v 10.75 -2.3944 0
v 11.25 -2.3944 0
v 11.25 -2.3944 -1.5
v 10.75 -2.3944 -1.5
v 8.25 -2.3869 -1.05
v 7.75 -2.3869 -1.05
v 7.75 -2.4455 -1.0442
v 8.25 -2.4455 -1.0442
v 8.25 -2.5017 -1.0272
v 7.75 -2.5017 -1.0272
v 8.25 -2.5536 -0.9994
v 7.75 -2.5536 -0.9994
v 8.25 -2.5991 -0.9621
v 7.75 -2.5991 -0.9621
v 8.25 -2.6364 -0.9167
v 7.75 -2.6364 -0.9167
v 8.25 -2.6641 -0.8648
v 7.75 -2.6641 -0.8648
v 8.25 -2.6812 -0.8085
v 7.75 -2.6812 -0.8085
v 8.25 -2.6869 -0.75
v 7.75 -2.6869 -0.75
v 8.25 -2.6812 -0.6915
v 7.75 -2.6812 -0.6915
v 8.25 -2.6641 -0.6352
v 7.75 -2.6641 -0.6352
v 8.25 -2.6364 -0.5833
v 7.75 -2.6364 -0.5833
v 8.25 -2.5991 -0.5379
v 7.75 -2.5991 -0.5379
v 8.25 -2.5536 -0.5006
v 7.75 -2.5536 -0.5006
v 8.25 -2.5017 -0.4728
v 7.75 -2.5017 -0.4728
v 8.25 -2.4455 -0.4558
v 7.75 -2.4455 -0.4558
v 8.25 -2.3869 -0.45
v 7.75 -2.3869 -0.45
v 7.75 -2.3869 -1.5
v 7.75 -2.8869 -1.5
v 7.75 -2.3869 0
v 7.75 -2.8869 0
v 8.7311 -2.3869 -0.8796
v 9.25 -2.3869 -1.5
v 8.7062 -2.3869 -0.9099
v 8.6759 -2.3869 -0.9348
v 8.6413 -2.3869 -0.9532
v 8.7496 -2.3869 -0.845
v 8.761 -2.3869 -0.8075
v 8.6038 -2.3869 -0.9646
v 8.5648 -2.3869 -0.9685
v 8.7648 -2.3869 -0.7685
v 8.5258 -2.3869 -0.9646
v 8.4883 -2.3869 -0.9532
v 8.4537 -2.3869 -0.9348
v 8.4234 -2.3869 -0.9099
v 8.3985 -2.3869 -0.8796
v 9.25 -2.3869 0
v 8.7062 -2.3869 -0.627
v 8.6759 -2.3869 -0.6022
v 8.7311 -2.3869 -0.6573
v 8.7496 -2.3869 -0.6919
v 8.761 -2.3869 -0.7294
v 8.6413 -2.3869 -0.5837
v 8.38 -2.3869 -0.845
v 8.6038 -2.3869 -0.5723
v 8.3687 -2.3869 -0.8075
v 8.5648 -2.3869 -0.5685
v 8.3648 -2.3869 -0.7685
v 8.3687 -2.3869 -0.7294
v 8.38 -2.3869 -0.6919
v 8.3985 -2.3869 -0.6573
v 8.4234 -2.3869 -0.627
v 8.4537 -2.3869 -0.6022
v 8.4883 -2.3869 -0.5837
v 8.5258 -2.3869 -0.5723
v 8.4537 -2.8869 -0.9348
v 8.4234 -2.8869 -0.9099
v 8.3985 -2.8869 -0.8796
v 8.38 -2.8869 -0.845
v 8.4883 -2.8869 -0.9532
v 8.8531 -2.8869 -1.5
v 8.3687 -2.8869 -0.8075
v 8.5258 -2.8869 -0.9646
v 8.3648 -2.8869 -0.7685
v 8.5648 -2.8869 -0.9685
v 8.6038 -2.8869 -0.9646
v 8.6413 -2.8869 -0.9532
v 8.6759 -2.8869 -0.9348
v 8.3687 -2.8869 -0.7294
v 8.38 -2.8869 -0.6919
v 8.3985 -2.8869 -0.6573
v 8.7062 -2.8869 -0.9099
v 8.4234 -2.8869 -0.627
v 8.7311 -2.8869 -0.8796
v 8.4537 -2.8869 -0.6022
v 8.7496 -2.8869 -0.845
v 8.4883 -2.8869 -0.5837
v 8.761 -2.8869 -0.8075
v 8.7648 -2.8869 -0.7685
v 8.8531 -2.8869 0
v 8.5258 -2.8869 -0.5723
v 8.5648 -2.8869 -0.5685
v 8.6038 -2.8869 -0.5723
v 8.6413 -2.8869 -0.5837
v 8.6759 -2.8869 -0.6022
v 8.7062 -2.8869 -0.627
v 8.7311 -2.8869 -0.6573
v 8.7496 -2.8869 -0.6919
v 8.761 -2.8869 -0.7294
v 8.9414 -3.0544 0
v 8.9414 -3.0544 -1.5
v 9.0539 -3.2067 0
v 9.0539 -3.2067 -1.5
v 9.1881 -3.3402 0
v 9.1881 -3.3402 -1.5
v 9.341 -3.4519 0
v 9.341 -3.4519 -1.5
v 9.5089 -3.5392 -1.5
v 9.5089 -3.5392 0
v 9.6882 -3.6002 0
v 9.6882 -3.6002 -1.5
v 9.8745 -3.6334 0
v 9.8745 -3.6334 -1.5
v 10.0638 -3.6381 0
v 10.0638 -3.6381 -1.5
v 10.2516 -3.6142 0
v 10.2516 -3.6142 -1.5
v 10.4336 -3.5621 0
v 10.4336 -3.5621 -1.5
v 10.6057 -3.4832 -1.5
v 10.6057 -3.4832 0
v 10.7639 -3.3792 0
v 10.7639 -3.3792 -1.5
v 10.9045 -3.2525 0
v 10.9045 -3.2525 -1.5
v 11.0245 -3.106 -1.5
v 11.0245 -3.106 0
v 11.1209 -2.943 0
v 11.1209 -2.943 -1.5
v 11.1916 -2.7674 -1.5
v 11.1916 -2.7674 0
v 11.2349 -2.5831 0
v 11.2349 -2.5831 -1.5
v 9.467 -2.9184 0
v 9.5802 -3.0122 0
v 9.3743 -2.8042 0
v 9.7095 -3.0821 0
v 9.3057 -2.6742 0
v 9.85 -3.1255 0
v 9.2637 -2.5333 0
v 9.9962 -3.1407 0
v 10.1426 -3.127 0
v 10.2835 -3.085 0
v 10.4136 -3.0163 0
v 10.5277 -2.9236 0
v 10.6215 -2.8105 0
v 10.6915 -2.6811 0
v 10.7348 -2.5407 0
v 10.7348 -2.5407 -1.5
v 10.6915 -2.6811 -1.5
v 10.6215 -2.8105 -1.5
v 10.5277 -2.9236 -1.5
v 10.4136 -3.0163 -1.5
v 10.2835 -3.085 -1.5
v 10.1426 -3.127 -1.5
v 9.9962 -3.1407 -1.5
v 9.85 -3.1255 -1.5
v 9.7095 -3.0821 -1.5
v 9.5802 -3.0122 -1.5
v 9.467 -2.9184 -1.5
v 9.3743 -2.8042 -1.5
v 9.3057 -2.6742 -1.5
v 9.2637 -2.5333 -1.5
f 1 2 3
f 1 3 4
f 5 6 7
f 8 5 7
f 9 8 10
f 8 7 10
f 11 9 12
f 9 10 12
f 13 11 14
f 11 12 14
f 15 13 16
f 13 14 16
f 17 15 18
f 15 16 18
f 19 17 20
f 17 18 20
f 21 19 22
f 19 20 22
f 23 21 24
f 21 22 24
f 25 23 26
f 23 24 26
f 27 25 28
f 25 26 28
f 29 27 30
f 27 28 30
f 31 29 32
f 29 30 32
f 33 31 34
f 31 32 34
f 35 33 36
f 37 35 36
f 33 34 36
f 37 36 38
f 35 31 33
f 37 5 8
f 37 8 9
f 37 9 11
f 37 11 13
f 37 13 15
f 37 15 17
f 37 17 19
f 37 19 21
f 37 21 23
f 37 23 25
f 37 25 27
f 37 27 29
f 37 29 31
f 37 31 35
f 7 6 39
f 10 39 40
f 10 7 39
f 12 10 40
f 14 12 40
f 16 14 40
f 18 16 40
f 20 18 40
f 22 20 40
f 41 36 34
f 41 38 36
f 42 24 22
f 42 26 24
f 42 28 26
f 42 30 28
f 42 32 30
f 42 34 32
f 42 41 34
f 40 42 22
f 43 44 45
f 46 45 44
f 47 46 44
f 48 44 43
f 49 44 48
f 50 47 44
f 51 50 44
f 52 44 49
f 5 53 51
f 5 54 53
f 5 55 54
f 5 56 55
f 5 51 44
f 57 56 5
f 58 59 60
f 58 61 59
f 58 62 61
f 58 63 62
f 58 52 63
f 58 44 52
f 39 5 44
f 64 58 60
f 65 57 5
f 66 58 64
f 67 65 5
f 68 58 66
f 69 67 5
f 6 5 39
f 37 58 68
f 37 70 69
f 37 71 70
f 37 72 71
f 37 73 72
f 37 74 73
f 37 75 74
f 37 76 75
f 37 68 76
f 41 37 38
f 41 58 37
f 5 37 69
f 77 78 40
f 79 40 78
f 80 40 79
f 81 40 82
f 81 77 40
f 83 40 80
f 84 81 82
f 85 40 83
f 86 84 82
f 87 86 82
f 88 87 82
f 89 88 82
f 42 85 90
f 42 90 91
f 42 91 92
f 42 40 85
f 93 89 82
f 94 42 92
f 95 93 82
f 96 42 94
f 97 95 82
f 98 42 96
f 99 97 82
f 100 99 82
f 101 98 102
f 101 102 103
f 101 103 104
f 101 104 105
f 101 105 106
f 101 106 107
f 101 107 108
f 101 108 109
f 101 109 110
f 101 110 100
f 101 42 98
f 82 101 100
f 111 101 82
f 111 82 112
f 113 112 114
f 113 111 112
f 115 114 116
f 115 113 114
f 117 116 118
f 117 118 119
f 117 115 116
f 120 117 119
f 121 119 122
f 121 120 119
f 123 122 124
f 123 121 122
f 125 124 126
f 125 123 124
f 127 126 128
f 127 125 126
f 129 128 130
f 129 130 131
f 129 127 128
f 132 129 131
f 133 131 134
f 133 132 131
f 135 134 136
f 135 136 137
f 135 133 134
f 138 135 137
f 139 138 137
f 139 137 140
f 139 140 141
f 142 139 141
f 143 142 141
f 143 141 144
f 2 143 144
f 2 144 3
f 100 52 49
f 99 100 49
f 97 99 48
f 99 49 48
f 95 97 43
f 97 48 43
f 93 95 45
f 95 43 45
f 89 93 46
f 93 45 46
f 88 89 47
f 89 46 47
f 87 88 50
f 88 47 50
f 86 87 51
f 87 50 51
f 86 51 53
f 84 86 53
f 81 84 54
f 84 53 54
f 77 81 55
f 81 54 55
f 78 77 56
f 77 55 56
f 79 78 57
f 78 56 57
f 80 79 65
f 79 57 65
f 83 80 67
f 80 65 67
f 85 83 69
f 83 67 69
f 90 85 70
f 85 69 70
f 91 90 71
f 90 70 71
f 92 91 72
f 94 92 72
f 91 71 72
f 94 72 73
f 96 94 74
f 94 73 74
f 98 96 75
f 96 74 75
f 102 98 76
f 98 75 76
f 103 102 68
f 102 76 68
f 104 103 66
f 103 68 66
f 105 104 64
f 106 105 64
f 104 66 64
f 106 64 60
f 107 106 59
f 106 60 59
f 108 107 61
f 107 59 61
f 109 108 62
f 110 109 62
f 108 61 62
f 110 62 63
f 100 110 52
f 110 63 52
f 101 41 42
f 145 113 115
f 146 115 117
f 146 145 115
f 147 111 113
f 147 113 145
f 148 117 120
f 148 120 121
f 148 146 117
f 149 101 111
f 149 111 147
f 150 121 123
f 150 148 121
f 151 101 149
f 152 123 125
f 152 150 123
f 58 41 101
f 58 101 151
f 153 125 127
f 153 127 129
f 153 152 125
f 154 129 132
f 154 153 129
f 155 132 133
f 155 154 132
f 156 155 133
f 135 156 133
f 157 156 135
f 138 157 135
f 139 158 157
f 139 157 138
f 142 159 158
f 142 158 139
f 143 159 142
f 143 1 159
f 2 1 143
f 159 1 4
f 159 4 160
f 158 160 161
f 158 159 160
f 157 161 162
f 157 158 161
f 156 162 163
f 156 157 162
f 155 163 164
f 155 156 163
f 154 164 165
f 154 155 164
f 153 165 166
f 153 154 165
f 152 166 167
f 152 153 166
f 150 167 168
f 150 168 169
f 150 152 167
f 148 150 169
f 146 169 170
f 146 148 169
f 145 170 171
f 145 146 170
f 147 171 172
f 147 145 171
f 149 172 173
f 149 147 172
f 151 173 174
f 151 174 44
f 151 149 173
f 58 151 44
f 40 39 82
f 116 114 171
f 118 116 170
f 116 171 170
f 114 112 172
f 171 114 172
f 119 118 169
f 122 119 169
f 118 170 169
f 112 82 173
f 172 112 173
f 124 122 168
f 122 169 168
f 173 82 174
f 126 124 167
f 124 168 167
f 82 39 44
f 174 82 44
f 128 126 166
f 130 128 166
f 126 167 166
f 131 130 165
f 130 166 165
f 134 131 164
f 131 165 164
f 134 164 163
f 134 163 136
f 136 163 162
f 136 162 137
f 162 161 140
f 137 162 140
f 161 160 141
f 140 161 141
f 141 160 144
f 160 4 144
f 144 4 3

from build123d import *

# Parameters (mm, degrees)
EXTRUDE_1_DEPTH     = 1.5
SKETCH_3_R          = 0.3
CUT_EXTRUDE_1_DEPTH = 0.5
SKETCH_4_R          = 0.2
CUT_EXTRUDE_2_DEPTH = 0.5


with BuildPart() as part:
    # 草图2 → 凸台-拉伸1 (new body)
    with BuildSketch(Plane.XY):
        with BuildLine():
            Line((9.249993009, -2.386934839), (7.749993009, -2.386934839))
            Line((7.749993009, -2.386934839), (7.749993009, -2.886934839))
            Line((7.749993009, -2.886934839), (8.853123955, -2.886934839))
            ThreePointArc((8.853123955, -2.886934839), (10.251588952, -3.614156243), (11.249979027, -2.394413411))
            Line((11.249979027, -2.394413411), (10.749979027, -2.394413411))
            ThreePointArc((10.749979027, -2.394413411), (9.996246732, -3.140667133), (9.249993009, -2.386934839))
        make_face()
    extrude(amount=-EXTRUDE_1_DEPTH)

    # 草图3 → 切除-拉伸1 (cut)
    with BuildSketch(Plane.ZY.offset(-7.749993009)):
        with Locations((-0.75, -2.386934839)):
            Circle(SKETCH_3_R)
    extrude(amount=-CUT_EXTRUDE_1_DEPTH, mode=Mode.SUBTRACT)

    # 草图4 → 切除-拉伸2 (cut)
    with BuildSketch(Plane(origin=(0, -2.386934839, 0), x_dir=(1, 0, 0), z_dir=(0, 1, 0))):
        with Locations((8.564809318, 0.768458185)):
            Circle(SKETCH_4_R)
    extrude(amount=-CUT_EXTRUDE_2_DEPTH, mode=Mode.SUBTRACT)


solid = part.part
